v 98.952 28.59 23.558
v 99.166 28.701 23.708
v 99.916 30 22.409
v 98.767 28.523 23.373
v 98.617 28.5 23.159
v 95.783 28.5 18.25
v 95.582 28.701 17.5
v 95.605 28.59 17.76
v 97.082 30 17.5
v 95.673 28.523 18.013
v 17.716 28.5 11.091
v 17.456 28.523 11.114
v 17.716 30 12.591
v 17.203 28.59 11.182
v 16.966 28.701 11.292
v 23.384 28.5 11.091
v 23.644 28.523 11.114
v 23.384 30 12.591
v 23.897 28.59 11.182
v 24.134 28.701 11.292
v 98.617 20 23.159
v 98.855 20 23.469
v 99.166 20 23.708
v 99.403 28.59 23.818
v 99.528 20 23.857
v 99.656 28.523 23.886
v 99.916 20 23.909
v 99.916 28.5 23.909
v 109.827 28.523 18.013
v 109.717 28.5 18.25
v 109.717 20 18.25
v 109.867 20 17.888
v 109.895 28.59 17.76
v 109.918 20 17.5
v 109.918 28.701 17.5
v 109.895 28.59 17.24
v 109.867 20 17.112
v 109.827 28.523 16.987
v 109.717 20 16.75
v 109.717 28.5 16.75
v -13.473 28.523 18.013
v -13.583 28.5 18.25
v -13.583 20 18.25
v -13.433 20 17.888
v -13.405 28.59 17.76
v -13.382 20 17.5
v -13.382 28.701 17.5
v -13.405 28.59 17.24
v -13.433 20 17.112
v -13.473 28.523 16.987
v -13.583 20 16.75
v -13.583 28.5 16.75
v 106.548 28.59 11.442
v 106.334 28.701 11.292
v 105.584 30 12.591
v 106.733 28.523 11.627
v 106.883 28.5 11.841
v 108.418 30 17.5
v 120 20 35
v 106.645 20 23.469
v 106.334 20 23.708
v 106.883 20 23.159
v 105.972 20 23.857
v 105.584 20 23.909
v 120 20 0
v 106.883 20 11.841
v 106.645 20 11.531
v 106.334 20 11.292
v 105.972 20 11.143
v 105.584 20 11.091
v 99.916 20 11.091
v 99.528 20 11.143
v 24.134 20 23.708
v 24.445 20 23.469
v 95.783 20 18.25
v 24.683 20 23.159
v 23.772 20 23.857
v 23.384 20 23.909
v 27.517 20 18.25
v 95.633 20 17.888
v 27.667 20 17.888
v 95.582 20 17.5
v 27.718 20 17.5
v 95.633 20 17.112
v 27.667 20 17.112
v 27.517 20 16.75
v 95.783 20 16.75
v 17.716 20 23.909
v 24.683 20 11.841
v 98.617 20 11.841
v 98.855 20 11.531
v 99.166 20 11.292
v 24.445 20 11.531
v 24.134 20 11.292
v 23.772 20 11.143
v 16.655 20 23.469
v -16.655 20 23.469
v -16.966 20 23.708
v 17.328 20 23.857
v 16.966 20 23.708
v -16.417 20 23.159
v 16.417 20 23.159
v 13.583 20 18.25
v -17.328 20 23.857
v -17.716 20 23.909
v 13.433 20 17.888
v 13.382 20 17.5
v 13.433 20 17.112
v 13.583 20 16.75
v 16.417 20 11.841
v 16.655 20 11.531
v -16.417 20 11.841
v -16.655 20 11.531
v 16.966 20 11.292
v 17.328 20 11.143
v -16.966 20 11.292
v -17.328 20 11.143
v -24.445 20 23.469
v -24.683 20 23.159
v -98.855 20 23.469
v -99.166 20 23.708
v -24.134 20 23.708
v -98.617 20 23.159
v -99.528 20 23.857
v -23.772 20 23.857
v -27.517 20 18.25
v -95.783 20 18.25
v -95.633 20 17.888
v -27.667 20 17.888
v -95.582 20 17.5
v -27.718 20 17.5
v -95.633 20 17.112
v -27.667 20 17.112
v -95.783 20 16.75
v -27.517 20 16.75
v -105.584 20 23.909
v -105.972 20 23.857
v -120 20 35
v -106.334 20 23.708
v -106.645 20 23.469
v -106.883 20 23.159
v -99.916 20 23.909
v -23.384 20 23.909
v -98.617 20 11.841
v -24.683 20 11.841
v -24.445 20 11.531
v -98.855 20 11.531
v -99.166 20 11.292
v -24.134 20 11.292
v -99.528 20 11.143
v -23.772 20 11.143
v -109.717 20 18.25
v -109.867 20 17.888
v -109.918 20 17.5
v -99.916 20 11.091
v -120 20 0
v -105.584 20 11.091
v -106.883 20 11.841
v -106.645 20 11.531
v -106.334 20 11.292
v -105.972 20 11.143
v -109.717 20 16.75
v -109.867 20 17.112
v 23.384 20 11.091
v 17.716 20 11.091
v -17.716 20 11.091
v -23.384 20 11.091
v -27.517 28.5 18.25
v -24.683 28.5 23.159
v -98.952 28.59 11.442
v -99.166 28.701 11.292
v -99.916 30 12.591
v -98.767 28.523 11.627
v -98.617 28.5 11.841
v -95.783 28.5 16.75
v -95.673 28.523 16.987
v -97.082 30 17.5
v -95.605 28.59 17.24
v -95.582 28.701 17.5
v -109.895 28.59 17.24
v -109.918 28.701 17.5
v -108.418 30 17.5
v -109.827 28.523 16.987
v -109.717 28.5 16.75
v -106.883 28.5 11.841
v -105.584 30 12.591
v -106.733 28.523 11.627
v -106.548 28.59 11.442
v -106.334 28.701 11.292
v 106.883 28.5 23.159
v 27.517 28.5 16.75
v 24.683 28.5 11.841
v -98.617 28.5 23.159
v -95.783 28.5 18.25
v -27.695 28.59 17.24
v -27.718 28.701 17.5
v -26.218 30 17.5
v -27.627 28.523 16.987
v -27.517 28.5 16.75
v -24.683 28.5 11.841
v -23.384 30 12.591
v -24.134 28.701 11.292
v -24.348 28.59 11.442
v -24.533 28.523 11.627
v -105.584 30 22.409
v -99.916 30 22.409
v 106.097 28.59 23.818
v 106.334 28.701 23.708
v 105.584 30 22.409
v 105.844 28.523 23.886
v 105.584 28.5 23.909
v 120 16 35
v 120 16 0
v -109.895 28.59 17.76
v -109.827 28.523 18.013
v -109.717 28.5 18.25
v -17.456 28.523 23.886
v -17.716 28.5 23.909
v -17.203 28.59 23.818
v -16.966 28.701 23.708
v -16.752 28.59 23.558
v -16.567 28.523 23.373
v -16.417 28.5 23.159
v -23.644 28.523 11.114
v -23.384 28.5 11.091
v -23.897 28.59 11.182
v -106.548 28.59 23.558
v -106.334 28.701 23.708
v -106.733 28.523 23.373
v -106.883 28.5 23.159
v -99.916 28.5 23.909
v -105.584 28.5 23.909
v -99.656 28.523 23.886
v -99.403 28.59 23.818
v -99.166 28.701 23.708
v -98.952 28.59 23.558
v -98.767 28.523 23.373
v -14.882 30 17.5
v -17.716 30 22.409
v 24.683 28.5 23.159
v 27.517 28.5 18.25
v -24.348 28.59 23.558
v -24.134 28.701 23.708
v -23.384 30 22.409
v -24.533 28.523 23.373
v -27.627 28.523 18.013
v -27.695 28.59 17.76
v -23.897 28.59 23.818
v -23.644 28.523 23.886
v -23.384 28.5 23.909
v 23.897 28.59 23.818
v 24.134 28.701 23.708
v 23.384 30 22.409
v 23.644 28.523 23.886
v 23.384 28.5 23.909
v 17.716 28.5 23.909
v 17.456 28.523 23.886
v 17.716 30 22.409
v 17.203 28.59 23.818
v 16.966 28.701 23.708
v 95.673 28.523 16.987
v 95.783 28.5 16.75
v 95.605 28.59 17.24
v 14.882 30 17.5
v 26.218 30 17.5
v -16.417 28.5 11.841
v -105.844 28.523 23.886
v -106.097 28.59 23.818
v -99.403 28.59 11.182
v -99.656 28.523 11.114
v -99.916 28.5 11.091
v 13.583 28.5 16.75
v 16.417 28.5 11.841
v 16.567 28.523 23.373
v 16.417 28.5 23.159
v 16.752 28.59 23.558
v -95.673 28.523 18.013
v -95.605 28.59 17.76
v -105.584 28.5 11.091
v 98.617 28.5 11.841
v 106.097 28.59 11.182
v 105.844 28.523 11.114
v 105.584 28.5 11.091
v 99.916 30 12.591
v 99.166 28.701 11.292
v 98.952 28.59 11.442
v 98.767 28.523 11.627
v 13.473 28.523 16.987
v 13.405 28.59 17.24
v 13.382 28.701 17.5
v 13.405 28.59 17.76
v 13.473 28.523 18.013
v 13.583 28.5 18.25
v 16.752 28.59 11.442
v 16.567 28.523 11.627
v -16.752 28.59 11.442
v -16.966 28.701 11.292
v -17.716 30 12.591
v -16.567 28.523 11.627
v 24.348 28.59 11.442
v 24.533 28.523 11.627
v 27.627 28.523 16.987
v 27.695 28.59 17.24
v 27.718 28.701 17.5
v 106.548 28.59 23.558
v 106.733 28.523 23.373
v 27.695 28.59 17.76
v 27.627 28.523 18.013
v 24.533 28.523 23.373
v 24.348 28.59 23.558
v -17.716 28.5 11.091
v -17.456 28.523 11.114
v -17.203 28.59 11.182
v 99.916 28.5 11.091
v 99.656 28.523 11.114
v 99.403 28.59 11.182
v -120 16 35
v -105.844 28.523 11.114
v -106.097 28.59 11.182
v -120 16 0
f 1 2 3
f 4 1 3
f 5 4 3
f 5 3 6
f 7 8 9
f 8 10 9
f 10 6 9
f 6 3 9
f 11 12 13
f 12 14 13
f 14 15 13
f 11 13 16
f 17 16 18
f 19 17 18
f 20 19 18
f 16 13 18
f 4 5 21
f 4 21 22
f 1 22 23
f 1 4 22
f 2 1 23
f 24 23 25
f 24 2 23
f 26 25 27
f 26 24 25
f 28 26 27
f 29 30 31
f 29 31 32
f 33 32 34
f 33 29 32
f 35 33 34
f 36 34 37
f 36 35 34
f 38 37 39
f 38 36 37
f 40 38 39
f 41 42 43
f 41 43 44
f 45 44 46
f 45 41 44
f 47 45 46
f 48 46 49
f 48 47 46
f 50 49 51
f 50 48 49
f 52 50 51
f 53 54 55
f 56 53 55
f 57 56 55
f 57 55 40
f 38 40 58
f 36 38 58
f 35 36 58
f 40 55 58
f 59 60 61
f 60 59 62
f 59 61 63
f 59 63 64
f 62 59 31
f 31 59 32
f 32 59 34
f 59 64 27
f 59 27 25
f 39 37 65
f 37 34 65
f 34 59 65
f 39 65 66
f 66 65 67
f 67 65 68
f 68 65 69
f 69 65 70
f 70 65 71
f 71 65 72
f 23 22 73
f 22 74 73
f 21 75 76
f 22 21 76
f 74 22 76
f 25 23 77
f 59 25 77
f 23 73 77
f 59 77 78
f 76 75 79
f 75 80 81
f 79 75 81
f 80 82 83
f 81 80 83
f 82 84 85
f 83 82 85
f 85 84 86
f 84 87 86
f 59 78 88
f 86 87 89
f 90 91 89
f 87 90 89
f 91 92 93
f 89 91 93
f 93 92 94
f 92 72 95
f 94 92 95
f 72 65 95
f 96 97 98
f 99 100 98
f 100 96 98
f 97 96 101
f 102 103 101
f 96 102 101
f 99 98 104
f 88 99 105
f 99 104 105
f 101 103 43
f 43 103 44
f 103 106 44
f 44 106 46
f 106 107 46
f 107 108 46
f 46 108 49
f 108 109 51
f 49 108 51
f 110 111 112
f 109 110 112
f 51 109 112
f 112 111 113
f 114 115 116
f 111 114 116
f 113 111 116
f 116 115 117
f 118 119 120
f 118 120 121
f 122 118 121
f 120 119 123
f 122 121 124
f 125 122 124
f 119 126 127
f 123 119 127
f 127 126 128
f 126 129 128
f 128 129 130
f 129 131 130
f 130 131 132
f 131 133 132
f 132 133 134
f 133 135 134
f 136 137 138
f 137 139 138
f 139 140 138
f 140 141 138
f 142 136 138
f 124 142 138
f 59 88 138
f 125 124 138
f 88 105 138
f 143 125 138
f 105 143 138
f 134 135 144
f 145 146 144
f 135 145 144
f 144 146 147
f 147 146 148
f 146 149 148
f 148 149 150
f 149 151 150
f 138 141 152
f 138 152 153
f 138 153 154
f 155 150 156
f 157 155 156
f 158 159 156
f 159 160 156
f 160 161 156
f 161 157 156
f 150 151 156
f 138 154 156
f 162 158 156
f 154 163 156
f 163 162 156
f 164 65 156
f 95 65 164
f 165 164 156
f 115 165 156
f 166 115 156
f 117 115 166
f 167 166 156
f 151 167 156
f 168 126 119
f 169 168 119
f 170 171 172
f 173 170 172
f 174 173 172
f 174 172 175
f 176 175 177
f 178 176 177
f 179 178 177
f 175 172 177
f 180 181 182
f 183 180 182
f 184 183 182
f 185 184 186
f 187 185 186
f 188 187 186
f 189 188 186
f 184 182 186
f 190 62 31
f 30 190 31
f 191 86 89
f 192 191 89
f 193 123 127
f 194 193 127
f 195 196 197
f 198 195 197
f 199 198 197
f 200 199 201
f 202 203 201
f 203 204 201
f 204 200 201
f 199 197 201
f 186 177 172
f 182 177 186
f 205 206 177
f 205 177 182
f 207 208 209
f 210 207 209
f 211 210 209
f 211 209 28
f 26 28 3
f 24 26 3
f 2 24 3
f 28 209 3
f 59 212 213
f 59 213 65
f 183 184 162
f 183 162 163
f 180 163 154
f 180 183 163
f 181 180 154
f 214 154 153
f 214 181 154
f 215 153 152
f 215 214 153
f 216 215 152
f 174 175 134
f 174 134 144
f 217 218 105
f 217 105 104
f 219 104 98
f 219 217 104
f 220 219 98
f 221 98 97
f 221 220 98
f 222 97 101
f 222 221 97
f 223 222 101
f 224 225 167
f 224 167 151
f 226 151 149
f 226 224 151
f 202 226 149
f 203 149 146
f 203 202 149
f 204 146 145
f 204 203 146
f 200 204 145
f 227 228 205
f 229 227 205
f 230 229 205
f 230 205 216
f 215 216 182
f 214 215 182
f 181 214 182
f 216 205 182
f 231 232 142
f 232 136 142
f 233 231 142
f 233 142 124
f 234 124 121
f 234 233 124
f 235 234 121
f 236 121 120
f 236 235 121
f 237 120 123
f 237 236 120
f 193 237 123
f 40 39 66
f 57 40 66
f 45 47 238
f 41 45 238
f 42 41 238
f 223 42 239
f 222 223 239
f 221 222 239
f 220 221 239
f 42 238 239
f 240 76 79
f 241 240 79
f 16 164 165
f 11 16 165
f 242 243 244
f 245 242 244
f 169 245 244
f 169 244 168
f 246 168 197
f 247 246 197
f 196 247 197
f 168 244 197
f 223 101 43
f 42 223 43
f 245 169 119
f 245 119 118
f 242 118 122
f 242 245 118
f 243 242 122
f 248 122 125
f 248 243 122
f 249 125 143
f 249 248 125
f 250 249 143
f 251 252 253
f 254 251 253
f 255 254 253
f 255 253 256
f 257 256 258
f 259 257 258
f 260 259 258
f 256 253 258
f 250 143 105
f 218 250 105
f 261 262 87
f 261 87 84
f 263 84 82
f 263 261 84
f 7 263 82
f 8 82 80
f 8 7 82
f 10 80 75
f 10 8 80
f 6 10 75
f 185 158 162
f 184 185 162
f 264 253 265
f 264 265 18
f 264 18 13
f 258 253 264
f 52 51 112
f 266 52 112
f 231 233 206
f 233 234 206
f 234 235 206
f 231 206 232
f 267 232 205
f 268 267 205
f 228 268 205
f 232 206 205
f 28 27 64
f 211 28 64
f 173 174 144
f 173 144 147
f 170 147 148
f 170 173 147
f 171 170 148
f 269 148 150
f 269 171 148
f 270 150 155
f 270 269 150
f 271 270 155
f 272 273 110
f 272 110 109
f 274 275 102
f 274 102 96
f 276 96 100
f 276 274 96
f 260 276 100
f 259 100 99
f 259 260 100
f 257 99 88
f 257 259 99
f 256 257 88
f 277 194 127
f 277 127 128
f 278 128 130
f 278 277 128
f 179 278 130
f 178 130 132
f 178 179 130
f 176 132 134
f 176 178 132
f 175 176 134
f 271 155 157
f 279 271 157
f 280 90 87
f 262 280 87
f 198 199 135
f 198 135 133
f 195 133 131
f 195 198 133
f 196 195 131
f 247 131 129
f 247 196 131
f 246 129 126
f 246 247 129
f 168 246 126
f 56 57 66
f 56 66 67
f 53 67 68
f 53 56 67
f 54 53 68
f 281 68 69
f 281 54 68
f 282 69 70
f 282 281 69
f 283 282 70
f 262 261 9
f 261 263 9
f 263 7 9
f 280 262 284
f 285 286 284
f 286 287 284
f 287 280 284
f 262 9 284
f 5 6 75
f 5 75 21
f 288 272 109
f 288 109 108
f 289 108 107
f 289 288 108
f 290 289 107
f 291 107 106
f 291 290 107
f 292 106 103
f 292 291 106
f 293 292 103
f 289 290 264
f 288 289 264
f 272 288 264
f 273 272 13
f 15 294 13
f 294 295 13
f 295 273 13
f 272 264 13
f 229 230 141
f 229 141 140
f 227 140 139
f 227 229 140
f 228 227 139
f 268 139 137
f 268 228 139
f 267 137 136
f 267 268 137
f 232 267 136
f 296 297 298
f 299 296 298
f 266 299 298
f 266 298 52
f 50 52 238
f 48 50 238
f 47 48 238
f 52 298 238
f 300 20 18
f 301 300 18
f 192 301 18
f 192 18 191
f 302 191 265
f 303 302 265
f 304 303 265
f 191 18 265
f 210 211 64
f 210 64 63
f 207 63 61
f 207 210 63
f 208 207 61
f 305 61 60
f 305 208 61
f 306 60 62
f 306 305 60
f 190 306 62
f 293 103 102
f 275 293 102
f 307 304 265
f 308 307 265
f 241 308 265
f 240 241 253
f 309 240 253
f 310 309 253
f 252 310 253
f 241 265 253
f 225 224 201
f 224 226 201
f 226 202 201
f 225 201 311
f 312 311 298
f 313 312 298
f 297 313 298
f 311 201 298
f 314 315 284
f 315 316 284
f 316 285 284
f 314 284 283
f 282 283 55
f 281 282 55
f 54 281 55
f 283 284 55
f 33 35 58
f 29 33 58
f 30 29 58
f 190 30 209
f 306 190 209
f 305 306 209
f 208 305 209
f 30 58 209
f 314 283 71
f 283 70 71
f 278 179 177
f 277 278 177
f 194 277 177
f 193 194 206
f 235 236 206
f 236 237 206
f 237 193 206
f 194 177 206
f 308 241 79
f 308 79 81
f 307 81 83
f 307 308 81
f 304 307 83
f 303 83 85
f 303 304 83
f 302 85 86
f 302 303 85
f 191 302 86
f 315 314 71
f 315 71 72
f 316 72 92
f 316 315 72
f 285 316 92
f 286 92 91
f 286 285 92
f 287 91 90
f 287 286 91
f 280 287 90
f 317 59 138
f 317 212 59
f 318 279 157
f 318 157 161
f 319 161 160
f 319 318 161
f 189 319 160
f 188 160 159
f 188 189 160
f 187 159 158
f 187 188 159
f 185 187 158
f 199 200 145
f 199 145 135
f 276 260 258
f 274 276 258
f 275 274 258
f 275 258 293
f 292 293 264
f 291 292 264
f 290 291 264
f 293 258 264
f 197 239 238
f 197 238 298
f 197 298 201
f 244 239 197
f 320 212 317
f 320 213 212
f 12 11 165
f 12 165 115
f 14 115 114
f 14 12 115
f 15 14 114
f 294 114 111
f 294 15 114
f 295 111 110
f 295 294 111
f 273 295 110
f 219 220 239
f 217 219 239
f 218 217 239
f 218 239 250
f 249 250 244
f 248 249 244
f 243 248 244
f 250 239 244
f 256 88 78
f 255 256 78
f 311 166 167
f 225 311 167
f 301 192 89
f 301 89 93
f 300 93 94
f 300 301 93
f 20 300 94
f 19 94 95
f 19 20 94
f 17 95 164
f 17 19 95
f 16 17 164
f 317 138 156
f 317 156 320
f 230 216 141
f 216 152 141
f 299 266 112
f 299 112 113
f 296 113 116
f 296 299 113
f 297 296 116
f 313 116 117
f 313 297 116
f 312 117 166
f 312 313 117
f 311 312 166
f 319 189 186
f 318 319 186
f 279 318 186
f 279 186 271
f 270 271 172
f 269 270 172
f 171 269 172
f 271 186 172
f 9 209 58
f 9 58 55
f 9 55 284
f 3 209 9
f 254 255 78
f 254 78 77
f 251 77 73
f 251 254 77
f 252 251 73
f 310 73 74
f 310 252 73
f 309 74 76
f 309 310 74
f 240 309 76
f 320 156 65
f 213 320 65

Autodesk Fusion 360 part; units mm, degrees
sketch "Sketch1" plane through (0, 0, 0) normal (0, 0, 1) x (1, 0, 0)
  line L0 (120, 20) -> (-120, 20)
  line L1 (-120, 20) -> (-120, -20)
  line L2 (-120, -20) -> (120, -20)
  line L3 (120, -20) -> (120, 20)
  line L4 (120, 20) -> (-120, -20) construction
  line L5 (-120, 20) -> (120, -20) construction
  dimension "d1" = 240
  dimension "d2" = 40
extrude "Extrude1" add sketch "Sketch1" along normal blind 5
sketch "Sketch2" plane through (0, 0, 5) normal (0, 0, 1) x (-1, 0, 0)
  line L0 (-120, 20) -> (-120, -20)
  line L1 (120, -20) -> (120, 20)
  line L2 (120, 20) -> (-120, 20)
  line L3 (120, -20) -> (-120, -20)
  line L4 (-120, -20) -> (-120, -16)
  line L5 (-120, -16) -> (120, -16)
  line L6 (120, -16) -> (120, -20)
  line L7 (-120, -20) -> (120, -20)
  dimension "d7" = 4
extrude "Extrude3" add sketch "Sketch2" along normal blind 30 contours L0 L1 L3 L4 L5 L6 L7
sketch "Sketch3" plane through (0, 20, 0) normal (0, 1, 0) x (-1, 0, 0)
  line L0 (-120, 0) -> (120, 0)
  line L1 (120, 0) -> (120, 35)
  line L2 (120, 35) -> (-120, 35)
  line L3 (-120, 35) -> (-120, 0)
  line L4 (0, 35) -> (0, 0) construction
  line L5 (20.55, 35) -> (20.55, 0) construction
  line L6 (61.65, 35) -> (61.65, 0) construction
  line L7 (102.75, 35) -> (102.75, 0) construction
  line L8 (-20.55, 35) -> (-20.55, 0) construction
  line L9 (-61.65, 35) -> (-61.65, 0) construction
  line L10 (-102.75, 35) -> (-102.75, 0) construction
  line L11 (120, 17.5) -> (-120, 17.5) construction
  line L12 (27.95, 17.5) -> (24.25, 23.9086)
  line L13 (24.25, 23.9086) -> (16.85, 23.9086)
  line L14 (16.85, 23.9086) -> (13.15, 17.5)
  line L15 (13.15, 17.5) -> (16.85, 11.0914)
  line L16 (16.85, 11.0914) -> (24.25, 11.0914)
  line L17 (24.25, 11.0914) -> (27.95, 17.5)
  line L18 (-13.15, 17.5) -> (-16.85, 23.9086)
  line L19 (-16.85, 23.9086) -> (-24.25, 23.9086)
  line L20 (-24.25, 23.9086) -> (-27.95, 17.5)
  line L21 (-27.95, 17.5) -> (-24.25, 11.0914)
  line L22 (-24.25, 11.0914) -> (-16.85, 11.0914)
  line L23 (-16.85, 11.0914) -> (-13.15, 17.5)
  line L24 (-95.35, 17.5) -> (-99.05, 23.9086)
  line L25 (-99.05, 23.9086) -> (-106.45, 23.9086)
  line L26 (-106.45, 23.9086) -> (-110.15, 17.5)
  line L27 (-110.15, 17.5) -> (-106.45, 11.0914)
  line L28 (-106.45, 11.0914) -> (-99.05, 11.0914)
  line L29 (-99.05, 11.0914) -> (-95.35, 17.5)
  line L30 (95.35, 17.5) -> (99.05, 11.0914)
  line L31 (99.05, 11.0914) -> (106.45, 11.0914)
  line L32 (106.45, 11.0914) -> (110.15, 17.5)
  line L33 (110.15, 17.5) -> (106.45, 23.9086)
  line L34 (106.45, 23.9086) -> (99.05, 23.9086)
  line L35 (99.05, 23.9086) -> (95.35, 17.5)
  point P0 (20.55, 17.5)
  point P1 (-20.55, 17.5)
  point P2 (-102.75, 17.5)
  point P3 (102.75, 17.5)
  dimension "d10" = 20.55
  dimension "d11" = 41.1
  dimension "d12" = 41.1
  dimension "d13" = 41.1
  dimension "d14" = 41.1
  dimension "d15" = 20.55
  dimension "d16" = 7.4
  dimension "d17" = 7.4
  dimension "d18" = 7.4
  dimension "d19" = 7.4
extrude "Extrude4" add sketch "Sketch3" along normal blind 10 contours L12 L13 L14 L15 L16 L17 | L18 L19 L20 L21 L22 L23 | L24 L25 L26 L27 L28 L29 | L30 L31 L32 L33 L34 L35
extrude "Extrude8" cut 1 faces at (-40, -20, 1.6667) along direction (0, 1, 0) up to surface (36 mm away)
chamfer "Chamfer15" distance 1.5 angle 45 24 edges at (102.75, 30, 23.9086) (108.3, 30, 20.7043) (108.3, 30, 14.2957) (97.2, 30, 20.7043) (97.2, 30, 14.2957) (102.75, 30, 11.0914) (20.55, 30, 23.9086) (26.1, 30, 20.7043) (26.1, 30, 14.2957) (15, 30, 20.7043) (15, 30, 14.2957) (20.55, 30, 11.0914) (-20.55, 30, 23.9086) (-15, 30, 20.7043) (-15, 30, 14.2957) (-26.1, 30, 20.7043) (-26.1, 30, 14.2957) (-20.55, 30, 11.0914) (-102.75, 30, 23.9086) (-97.2, 30, 20.7043) (-97.2, 30, 14.2957) (-108.3, 30, 20.7043) (-108.3, 30, 14.2957) (-102.75, 30, 11.0914)
fillet "Fillet3" radius 1.5 24 edges at (99.05, 24.25, 23.9086) (110.15, 24.25, 17.5) (106.45, 24.25, 23.9086) (106.45, 24.25, 11.0914) (16.85, 24.25, 23.9086) (24.25, 24.25, 23.9086) (27.95, 24.25, 17.5) (24.25, 24.25, 11.0914) (-24.25, 24.25, 23.9086) (-16.85, 24.25, 23.9086) (-13.15, 24.25, 17.5) (-16.85, 24.25, 11.0914) (-106.45, 24.25, 23.9086) (-99.05, 24.25, 23.9086) (-95.35, 24.25, 17.5) (-99.05, 24.25, 11.0914) (-110.15, 24.25, 17.5) (-106.45, 24.25, 11.0914) (-27.95, 24.25, 17.5) (-24.25, 24.25, 11.0914) (13.15, 24.25, 17.5) (16.85, 24.25, 11.0914) (95.35, 24.25, 17.5) (99.05, 24.25, 11.0914)
equation "d22 = ( 240 / 6 ) * 1 mm"
equation "d60 = ( 80.8 / 3 ) * 1 mm"
equation "d61 = ( 80.8 / 3 ) * 1 mm"
equation "d64 = ( 26.933 / 2 ) * 1 mm"
equation "d65 = ( 26.933 / 2 ) * 1 mm"
equation "d73 = ( 80.8 / 3 ) * 1 mm"
equation "d74 = ( 80.8 / 3 ) * 1 mm"
equation "d77 = ( 26.933 / 2 ) * 1 mm"
equation "d81 = ( 17.5 / 2 ) * 1 mm"
